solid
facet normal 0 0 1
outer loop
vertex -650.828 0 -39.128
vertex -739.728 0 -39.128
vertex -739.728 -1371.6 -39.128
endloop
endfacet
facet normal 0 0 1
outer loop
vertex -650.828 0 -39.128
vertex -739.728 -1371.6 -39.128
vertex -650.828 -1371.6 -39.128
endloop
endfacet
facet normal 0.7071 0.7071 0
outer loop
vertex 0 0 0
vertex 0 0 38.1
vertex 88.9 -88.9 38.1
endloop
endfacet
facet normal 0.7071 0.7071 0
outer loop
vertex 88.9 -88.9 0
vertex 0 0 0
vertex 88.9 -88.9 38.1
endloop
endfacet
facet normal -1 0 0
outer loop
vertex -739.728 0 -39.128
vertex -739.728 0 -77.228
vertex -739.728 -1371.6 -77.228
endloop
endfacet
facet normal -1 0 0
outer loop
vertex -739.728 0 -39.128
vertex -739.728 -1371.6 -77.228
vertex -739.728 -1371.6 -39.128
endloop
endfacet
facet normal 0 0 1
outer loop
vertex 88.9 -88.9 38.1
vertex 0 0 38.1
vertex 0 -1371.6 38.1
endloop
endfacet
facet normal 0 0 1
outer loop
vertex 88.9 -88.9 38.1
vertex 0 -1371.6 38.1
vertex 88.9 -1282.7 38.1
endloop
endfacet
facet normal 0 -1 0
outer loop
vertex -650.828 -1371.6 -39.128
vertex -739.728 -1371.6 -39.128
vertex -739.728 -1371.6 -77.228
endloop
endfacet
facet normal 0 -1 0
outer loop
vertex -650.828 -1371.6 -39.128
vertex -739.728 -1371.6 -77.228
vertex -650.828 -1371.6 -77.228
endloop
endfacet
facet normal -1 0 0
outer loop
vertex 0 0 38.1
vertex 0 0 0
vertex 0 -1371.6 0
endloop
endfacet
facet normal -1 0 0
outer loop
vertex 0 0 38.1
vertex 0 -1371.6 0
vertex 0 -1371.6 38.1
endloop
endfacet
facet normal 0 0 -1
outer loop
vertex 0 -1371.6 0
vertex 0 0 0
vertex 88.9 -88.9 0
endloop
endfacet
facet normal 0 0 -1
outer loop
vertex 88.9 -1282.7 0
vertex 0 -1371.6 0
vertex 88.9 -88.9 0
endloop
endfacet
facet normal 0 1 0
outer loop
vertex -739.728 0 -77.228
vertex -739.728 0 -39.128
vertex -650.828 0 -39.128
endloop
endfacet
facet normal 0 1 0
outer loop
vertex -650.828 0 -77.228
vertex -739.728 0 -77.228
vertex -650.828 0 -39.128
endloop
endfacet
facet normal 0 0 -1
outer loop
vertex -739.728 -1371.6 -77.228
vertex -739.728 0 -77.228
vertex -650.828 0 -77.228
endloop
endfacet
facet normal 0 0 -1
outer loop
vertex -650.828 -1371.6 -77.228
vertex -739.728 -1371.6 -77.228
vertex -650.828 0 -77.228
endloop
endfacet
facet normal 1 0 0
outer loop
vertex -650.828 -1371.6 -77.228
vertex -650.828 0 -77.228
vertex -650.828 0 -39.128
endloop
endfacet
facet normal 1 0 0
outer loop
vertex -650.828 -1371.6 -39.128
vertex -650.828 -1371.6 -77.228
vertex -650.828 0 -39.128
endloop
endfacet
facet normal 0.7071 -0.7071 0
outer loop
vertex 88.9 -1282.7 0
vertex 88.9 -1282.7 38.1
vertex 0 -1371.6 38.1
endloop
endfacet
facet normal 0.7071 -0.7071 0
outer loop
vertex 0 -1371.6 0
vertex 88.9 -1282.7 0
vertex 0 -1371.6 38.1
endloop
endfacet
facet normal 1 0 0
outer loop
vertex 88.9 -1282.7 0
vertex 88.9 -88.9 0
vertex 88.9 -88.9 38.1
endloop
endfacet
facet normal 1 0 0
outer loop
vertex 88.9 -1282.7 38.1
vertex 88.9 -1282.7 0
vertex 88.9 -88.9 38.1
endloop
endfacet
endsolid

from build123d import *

# Parameters (mm, degrees)
F0_W     = 88.9
F0_H     = 38.1
F1_DEPTH = 1371.6
F3_DEPTH = 38.1
F4_W     = 88.9
F4_H     = 38.1
F5_DEPTH = 1371.6


with BuildPart() as f1:
    # F0 (on Front) → F1 (new body)
    with BuildSketch(Plane.XZ):
        with Locations((44.45, 19.05)):
            Rectangle(F0_W, F0_H)
    extrude(amount=F1_DEPTH)

    # F2 (on face) → F3 (cut, through all)
    with BuildSketch(Plane.XY.offset(38.1)):
        Polygon((88.9, -1282.7), (0, -1371.6), (88.9, -1371.6), align=None)
        Polygon((0, 0), (88.9, -88.9), (88.9, 0), align=None)
    extrude(amount=-F3_DEPTH, mode=Mode.SUBTRACT)


with BuildPart() as f5:
    # F4 (on Front) → F5 (new body)
    with BuildSketch(Plane.XZ):
        with Locations((-695.277959, -58.178241)):
            Rectangle(F4_W, F4_H)
    extrude(amount=F5_DEPTH)


solid = Compound([f1.part, f5.part])
